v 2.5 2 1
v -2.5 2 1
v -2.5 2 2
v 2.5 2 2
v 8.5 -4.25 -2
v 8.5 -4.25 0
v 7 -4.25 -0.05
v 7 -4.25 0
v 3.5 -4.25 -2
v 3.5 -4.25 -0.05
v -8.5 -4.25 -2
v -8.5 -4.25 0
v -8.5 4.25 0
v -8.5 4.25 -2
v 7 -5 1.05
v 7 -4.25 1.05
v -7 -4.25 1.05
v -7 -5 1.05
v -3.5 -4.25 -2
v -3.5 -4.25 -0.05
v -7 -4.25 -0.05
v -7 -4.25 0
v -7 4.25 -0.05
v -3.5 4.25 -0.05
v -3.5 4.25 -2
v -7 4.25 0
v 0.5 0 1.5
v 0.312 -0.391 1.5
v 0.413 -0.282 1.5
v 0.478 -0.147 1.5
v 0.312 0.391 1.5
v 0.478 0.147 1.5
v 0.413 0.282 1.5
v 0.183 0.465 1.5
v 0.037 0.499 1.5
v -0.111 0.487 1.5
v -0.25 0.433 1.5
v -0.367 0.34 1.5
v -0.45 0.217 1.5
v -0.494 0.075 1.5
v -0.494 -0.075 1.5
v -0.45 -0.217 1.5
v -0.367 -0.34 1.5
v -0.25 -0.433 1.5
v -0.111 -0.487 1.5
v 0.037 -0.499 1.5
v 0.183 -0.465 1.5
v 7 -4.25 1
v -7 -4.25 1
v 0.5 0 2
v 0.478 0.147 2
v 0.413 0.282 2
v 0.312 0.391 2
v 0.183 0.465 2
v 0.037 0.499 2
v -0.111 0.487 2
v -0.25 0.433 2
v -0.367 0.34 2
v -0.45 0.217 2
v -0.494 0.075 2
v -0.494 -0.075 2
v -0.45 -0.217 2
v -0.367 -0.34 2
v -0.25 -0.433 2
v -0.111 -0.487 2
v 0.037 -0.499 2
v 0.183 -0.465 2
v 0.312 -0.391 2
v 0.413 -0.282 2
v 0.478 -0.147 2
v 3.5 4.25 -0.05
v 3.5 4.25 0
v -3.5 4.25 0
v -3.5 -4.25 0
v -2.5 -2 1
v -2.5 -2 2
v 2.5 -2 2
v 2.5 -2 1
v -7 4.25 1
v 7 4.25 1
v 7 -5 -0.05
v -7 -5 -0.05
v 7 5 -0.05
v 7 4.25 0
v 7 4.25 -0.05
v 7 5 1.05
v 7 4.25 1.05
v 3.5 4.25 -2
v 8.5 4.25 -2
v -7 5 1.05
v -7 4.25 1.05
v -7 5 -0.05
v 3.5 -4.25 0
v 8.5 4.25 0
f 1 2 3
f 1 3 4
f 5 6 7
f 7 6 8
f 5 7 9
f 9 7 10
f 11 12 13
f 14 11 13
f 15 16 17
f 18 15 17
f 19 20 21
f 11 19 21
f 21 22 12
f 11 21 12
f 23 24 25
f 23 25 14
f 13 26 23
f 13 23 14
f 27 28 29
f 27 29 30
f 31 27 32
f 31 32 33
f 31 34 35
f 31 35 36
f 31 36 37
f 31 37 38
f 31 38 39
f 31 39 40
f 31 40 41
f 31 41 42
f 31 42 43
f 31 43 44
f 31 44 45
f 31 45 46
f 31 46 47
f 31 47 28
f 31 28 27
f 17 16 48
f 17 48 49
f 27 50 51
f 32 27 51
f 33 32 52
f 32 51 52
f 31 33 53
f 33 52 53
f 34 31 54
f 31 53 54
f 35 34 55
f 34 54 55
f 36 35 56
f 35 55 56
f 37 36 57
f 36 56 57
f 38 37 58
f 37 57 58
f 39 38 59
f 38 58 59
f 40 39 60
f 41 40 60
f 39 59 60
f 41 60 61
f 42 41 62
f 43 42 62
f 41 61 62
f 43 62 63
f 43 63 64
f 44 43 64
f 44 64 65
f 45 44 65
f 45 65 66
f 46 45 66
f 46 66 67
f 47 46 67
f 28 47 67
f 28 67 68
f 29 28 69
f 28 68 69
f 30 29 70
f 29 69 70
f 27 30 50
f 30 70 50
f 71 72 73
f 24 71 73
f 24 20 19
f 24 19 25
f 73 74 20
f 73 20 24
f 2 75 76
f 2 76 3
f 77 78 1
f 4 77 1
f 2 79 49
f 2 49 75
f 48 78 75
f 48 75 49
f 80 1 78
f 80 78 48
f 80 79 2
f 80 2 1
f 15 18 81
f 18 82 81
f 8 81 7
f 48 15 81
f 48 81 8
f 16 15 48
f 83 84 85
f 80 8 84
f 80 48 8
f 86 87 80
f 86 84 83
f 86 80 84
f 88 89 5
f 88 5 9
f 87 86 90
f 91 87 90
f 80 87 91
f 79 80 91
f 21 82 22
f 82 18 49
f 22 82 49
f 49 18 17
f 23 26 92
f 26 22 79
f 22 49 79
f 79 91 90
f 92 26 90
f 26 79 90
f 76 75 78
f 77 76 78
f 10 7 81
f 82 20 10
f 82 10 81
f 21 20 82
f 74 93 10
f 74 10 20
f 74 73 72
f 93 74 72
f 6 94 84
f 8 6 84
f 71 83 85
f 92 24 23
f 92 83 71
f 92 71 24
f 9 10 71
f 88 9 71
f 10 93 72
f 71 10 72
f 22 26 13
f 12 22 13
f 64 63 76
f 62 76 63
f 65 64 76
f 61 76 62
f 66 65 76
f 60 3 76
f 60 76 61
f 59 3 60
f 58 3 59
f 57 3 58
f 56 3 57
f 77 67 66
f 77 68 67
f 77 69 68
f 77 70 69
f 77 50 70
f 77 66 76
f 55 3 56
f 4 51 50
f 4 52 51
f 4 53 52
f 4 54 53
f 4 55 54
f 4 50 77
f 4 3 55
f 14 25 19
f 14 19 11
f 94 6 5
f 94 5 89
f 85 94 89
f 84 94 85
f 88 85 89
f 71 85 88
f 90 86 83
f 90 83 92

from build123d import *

# Parameters (mm, degrees)
SKETCH1_W                = 14
SKETCH1_H                = 10
BOSS_EXTRUDE1_DEPTH      = 1
SKETCH2_W                = 5
SKETCH2_H                = 4
BOSS_EXTRUDE3_DEPTH      = 1
SKETCH3_W                = 5
SKETCH3_H                = 8.5
BOSS_EXTRUDE4_DEPTH      = 2
SKETCH4_R                = 0.5
CUT_EXTRUDE1_DEPTH       = 0.5
BOSS_EXTRUDE5_DEPTH      = 0.05
BOSS_EXTRUDE5_DEPTH_BACK = 1.05
SKETCH5_W                = 14
SKETCH5_H                = 0.75


with BuildPart() as part:
    # Sketch1 → Boss-Extrude1 (new body)
    with BuildSketch(Plane.XY):
        Rectangle(SKETCH1_W, SKETCH1_H)
    extrude(amount=BOSS_EXTRUDE1_DEPTH)

    # Sketch2 → Boss-Extrude3 (add)
    with BuildSketch(Plane.XY.offset(1)):
        Rectangle(SKETCH2_W, SKETCH2_H)
    extrude(amount=BOSS_EXTRUDE3_DEPTH)

    # Sketch3 → Boss-Extrude4 (add)
    with BuildSketch(Plane(origin=(0, 0, 0), x_dir=(-1, 0, 0), z_dir=(0, 0, -1))):
        with Locations((6, 0)):
            Rectangle(SKETCH3_W, SKETCH3_H)
        with Locations((-6, 0)):
            Rectangle(SKETCH3_W, SKETCH3_H)
    extrude(amount=BOSS_EXTRUDE4_DEPTH)

    # Sketch4 → Cut-Extrude1 (cut)
    with BuildSketch(Plane.XY.offset(2)):
        Circle(SKETCH4_R)
    extrude(amount=-CUT_EXTRUDE1_DEPTH, mode=Mode.SUBTRACT)

    # Sketch5 → Boss-Extrude5 (add, two sides: drawn at the far end of the back side and taken through both)
    with BuildSketch(Plane(origin=(0, 0, 0), x_dir=(-1, 0, 0), z_dir=(0, 0, -1)).offset(-BOSS_EXTRUDE5_DEPTH_BACK)):
        with Locations((0, 4.625)):
            Rectangle(SKETCH5_W, SKETCH5_H)
        with Locations((0, -4.625)):
            Rectangle(SKETCH5_W, SKETCH5_H)
    extrude(amount=BOSS_EXTRUDE5_DEPTH + BOSS_EXTRUDE5_DEPTH_BACK)


solid = part.part
